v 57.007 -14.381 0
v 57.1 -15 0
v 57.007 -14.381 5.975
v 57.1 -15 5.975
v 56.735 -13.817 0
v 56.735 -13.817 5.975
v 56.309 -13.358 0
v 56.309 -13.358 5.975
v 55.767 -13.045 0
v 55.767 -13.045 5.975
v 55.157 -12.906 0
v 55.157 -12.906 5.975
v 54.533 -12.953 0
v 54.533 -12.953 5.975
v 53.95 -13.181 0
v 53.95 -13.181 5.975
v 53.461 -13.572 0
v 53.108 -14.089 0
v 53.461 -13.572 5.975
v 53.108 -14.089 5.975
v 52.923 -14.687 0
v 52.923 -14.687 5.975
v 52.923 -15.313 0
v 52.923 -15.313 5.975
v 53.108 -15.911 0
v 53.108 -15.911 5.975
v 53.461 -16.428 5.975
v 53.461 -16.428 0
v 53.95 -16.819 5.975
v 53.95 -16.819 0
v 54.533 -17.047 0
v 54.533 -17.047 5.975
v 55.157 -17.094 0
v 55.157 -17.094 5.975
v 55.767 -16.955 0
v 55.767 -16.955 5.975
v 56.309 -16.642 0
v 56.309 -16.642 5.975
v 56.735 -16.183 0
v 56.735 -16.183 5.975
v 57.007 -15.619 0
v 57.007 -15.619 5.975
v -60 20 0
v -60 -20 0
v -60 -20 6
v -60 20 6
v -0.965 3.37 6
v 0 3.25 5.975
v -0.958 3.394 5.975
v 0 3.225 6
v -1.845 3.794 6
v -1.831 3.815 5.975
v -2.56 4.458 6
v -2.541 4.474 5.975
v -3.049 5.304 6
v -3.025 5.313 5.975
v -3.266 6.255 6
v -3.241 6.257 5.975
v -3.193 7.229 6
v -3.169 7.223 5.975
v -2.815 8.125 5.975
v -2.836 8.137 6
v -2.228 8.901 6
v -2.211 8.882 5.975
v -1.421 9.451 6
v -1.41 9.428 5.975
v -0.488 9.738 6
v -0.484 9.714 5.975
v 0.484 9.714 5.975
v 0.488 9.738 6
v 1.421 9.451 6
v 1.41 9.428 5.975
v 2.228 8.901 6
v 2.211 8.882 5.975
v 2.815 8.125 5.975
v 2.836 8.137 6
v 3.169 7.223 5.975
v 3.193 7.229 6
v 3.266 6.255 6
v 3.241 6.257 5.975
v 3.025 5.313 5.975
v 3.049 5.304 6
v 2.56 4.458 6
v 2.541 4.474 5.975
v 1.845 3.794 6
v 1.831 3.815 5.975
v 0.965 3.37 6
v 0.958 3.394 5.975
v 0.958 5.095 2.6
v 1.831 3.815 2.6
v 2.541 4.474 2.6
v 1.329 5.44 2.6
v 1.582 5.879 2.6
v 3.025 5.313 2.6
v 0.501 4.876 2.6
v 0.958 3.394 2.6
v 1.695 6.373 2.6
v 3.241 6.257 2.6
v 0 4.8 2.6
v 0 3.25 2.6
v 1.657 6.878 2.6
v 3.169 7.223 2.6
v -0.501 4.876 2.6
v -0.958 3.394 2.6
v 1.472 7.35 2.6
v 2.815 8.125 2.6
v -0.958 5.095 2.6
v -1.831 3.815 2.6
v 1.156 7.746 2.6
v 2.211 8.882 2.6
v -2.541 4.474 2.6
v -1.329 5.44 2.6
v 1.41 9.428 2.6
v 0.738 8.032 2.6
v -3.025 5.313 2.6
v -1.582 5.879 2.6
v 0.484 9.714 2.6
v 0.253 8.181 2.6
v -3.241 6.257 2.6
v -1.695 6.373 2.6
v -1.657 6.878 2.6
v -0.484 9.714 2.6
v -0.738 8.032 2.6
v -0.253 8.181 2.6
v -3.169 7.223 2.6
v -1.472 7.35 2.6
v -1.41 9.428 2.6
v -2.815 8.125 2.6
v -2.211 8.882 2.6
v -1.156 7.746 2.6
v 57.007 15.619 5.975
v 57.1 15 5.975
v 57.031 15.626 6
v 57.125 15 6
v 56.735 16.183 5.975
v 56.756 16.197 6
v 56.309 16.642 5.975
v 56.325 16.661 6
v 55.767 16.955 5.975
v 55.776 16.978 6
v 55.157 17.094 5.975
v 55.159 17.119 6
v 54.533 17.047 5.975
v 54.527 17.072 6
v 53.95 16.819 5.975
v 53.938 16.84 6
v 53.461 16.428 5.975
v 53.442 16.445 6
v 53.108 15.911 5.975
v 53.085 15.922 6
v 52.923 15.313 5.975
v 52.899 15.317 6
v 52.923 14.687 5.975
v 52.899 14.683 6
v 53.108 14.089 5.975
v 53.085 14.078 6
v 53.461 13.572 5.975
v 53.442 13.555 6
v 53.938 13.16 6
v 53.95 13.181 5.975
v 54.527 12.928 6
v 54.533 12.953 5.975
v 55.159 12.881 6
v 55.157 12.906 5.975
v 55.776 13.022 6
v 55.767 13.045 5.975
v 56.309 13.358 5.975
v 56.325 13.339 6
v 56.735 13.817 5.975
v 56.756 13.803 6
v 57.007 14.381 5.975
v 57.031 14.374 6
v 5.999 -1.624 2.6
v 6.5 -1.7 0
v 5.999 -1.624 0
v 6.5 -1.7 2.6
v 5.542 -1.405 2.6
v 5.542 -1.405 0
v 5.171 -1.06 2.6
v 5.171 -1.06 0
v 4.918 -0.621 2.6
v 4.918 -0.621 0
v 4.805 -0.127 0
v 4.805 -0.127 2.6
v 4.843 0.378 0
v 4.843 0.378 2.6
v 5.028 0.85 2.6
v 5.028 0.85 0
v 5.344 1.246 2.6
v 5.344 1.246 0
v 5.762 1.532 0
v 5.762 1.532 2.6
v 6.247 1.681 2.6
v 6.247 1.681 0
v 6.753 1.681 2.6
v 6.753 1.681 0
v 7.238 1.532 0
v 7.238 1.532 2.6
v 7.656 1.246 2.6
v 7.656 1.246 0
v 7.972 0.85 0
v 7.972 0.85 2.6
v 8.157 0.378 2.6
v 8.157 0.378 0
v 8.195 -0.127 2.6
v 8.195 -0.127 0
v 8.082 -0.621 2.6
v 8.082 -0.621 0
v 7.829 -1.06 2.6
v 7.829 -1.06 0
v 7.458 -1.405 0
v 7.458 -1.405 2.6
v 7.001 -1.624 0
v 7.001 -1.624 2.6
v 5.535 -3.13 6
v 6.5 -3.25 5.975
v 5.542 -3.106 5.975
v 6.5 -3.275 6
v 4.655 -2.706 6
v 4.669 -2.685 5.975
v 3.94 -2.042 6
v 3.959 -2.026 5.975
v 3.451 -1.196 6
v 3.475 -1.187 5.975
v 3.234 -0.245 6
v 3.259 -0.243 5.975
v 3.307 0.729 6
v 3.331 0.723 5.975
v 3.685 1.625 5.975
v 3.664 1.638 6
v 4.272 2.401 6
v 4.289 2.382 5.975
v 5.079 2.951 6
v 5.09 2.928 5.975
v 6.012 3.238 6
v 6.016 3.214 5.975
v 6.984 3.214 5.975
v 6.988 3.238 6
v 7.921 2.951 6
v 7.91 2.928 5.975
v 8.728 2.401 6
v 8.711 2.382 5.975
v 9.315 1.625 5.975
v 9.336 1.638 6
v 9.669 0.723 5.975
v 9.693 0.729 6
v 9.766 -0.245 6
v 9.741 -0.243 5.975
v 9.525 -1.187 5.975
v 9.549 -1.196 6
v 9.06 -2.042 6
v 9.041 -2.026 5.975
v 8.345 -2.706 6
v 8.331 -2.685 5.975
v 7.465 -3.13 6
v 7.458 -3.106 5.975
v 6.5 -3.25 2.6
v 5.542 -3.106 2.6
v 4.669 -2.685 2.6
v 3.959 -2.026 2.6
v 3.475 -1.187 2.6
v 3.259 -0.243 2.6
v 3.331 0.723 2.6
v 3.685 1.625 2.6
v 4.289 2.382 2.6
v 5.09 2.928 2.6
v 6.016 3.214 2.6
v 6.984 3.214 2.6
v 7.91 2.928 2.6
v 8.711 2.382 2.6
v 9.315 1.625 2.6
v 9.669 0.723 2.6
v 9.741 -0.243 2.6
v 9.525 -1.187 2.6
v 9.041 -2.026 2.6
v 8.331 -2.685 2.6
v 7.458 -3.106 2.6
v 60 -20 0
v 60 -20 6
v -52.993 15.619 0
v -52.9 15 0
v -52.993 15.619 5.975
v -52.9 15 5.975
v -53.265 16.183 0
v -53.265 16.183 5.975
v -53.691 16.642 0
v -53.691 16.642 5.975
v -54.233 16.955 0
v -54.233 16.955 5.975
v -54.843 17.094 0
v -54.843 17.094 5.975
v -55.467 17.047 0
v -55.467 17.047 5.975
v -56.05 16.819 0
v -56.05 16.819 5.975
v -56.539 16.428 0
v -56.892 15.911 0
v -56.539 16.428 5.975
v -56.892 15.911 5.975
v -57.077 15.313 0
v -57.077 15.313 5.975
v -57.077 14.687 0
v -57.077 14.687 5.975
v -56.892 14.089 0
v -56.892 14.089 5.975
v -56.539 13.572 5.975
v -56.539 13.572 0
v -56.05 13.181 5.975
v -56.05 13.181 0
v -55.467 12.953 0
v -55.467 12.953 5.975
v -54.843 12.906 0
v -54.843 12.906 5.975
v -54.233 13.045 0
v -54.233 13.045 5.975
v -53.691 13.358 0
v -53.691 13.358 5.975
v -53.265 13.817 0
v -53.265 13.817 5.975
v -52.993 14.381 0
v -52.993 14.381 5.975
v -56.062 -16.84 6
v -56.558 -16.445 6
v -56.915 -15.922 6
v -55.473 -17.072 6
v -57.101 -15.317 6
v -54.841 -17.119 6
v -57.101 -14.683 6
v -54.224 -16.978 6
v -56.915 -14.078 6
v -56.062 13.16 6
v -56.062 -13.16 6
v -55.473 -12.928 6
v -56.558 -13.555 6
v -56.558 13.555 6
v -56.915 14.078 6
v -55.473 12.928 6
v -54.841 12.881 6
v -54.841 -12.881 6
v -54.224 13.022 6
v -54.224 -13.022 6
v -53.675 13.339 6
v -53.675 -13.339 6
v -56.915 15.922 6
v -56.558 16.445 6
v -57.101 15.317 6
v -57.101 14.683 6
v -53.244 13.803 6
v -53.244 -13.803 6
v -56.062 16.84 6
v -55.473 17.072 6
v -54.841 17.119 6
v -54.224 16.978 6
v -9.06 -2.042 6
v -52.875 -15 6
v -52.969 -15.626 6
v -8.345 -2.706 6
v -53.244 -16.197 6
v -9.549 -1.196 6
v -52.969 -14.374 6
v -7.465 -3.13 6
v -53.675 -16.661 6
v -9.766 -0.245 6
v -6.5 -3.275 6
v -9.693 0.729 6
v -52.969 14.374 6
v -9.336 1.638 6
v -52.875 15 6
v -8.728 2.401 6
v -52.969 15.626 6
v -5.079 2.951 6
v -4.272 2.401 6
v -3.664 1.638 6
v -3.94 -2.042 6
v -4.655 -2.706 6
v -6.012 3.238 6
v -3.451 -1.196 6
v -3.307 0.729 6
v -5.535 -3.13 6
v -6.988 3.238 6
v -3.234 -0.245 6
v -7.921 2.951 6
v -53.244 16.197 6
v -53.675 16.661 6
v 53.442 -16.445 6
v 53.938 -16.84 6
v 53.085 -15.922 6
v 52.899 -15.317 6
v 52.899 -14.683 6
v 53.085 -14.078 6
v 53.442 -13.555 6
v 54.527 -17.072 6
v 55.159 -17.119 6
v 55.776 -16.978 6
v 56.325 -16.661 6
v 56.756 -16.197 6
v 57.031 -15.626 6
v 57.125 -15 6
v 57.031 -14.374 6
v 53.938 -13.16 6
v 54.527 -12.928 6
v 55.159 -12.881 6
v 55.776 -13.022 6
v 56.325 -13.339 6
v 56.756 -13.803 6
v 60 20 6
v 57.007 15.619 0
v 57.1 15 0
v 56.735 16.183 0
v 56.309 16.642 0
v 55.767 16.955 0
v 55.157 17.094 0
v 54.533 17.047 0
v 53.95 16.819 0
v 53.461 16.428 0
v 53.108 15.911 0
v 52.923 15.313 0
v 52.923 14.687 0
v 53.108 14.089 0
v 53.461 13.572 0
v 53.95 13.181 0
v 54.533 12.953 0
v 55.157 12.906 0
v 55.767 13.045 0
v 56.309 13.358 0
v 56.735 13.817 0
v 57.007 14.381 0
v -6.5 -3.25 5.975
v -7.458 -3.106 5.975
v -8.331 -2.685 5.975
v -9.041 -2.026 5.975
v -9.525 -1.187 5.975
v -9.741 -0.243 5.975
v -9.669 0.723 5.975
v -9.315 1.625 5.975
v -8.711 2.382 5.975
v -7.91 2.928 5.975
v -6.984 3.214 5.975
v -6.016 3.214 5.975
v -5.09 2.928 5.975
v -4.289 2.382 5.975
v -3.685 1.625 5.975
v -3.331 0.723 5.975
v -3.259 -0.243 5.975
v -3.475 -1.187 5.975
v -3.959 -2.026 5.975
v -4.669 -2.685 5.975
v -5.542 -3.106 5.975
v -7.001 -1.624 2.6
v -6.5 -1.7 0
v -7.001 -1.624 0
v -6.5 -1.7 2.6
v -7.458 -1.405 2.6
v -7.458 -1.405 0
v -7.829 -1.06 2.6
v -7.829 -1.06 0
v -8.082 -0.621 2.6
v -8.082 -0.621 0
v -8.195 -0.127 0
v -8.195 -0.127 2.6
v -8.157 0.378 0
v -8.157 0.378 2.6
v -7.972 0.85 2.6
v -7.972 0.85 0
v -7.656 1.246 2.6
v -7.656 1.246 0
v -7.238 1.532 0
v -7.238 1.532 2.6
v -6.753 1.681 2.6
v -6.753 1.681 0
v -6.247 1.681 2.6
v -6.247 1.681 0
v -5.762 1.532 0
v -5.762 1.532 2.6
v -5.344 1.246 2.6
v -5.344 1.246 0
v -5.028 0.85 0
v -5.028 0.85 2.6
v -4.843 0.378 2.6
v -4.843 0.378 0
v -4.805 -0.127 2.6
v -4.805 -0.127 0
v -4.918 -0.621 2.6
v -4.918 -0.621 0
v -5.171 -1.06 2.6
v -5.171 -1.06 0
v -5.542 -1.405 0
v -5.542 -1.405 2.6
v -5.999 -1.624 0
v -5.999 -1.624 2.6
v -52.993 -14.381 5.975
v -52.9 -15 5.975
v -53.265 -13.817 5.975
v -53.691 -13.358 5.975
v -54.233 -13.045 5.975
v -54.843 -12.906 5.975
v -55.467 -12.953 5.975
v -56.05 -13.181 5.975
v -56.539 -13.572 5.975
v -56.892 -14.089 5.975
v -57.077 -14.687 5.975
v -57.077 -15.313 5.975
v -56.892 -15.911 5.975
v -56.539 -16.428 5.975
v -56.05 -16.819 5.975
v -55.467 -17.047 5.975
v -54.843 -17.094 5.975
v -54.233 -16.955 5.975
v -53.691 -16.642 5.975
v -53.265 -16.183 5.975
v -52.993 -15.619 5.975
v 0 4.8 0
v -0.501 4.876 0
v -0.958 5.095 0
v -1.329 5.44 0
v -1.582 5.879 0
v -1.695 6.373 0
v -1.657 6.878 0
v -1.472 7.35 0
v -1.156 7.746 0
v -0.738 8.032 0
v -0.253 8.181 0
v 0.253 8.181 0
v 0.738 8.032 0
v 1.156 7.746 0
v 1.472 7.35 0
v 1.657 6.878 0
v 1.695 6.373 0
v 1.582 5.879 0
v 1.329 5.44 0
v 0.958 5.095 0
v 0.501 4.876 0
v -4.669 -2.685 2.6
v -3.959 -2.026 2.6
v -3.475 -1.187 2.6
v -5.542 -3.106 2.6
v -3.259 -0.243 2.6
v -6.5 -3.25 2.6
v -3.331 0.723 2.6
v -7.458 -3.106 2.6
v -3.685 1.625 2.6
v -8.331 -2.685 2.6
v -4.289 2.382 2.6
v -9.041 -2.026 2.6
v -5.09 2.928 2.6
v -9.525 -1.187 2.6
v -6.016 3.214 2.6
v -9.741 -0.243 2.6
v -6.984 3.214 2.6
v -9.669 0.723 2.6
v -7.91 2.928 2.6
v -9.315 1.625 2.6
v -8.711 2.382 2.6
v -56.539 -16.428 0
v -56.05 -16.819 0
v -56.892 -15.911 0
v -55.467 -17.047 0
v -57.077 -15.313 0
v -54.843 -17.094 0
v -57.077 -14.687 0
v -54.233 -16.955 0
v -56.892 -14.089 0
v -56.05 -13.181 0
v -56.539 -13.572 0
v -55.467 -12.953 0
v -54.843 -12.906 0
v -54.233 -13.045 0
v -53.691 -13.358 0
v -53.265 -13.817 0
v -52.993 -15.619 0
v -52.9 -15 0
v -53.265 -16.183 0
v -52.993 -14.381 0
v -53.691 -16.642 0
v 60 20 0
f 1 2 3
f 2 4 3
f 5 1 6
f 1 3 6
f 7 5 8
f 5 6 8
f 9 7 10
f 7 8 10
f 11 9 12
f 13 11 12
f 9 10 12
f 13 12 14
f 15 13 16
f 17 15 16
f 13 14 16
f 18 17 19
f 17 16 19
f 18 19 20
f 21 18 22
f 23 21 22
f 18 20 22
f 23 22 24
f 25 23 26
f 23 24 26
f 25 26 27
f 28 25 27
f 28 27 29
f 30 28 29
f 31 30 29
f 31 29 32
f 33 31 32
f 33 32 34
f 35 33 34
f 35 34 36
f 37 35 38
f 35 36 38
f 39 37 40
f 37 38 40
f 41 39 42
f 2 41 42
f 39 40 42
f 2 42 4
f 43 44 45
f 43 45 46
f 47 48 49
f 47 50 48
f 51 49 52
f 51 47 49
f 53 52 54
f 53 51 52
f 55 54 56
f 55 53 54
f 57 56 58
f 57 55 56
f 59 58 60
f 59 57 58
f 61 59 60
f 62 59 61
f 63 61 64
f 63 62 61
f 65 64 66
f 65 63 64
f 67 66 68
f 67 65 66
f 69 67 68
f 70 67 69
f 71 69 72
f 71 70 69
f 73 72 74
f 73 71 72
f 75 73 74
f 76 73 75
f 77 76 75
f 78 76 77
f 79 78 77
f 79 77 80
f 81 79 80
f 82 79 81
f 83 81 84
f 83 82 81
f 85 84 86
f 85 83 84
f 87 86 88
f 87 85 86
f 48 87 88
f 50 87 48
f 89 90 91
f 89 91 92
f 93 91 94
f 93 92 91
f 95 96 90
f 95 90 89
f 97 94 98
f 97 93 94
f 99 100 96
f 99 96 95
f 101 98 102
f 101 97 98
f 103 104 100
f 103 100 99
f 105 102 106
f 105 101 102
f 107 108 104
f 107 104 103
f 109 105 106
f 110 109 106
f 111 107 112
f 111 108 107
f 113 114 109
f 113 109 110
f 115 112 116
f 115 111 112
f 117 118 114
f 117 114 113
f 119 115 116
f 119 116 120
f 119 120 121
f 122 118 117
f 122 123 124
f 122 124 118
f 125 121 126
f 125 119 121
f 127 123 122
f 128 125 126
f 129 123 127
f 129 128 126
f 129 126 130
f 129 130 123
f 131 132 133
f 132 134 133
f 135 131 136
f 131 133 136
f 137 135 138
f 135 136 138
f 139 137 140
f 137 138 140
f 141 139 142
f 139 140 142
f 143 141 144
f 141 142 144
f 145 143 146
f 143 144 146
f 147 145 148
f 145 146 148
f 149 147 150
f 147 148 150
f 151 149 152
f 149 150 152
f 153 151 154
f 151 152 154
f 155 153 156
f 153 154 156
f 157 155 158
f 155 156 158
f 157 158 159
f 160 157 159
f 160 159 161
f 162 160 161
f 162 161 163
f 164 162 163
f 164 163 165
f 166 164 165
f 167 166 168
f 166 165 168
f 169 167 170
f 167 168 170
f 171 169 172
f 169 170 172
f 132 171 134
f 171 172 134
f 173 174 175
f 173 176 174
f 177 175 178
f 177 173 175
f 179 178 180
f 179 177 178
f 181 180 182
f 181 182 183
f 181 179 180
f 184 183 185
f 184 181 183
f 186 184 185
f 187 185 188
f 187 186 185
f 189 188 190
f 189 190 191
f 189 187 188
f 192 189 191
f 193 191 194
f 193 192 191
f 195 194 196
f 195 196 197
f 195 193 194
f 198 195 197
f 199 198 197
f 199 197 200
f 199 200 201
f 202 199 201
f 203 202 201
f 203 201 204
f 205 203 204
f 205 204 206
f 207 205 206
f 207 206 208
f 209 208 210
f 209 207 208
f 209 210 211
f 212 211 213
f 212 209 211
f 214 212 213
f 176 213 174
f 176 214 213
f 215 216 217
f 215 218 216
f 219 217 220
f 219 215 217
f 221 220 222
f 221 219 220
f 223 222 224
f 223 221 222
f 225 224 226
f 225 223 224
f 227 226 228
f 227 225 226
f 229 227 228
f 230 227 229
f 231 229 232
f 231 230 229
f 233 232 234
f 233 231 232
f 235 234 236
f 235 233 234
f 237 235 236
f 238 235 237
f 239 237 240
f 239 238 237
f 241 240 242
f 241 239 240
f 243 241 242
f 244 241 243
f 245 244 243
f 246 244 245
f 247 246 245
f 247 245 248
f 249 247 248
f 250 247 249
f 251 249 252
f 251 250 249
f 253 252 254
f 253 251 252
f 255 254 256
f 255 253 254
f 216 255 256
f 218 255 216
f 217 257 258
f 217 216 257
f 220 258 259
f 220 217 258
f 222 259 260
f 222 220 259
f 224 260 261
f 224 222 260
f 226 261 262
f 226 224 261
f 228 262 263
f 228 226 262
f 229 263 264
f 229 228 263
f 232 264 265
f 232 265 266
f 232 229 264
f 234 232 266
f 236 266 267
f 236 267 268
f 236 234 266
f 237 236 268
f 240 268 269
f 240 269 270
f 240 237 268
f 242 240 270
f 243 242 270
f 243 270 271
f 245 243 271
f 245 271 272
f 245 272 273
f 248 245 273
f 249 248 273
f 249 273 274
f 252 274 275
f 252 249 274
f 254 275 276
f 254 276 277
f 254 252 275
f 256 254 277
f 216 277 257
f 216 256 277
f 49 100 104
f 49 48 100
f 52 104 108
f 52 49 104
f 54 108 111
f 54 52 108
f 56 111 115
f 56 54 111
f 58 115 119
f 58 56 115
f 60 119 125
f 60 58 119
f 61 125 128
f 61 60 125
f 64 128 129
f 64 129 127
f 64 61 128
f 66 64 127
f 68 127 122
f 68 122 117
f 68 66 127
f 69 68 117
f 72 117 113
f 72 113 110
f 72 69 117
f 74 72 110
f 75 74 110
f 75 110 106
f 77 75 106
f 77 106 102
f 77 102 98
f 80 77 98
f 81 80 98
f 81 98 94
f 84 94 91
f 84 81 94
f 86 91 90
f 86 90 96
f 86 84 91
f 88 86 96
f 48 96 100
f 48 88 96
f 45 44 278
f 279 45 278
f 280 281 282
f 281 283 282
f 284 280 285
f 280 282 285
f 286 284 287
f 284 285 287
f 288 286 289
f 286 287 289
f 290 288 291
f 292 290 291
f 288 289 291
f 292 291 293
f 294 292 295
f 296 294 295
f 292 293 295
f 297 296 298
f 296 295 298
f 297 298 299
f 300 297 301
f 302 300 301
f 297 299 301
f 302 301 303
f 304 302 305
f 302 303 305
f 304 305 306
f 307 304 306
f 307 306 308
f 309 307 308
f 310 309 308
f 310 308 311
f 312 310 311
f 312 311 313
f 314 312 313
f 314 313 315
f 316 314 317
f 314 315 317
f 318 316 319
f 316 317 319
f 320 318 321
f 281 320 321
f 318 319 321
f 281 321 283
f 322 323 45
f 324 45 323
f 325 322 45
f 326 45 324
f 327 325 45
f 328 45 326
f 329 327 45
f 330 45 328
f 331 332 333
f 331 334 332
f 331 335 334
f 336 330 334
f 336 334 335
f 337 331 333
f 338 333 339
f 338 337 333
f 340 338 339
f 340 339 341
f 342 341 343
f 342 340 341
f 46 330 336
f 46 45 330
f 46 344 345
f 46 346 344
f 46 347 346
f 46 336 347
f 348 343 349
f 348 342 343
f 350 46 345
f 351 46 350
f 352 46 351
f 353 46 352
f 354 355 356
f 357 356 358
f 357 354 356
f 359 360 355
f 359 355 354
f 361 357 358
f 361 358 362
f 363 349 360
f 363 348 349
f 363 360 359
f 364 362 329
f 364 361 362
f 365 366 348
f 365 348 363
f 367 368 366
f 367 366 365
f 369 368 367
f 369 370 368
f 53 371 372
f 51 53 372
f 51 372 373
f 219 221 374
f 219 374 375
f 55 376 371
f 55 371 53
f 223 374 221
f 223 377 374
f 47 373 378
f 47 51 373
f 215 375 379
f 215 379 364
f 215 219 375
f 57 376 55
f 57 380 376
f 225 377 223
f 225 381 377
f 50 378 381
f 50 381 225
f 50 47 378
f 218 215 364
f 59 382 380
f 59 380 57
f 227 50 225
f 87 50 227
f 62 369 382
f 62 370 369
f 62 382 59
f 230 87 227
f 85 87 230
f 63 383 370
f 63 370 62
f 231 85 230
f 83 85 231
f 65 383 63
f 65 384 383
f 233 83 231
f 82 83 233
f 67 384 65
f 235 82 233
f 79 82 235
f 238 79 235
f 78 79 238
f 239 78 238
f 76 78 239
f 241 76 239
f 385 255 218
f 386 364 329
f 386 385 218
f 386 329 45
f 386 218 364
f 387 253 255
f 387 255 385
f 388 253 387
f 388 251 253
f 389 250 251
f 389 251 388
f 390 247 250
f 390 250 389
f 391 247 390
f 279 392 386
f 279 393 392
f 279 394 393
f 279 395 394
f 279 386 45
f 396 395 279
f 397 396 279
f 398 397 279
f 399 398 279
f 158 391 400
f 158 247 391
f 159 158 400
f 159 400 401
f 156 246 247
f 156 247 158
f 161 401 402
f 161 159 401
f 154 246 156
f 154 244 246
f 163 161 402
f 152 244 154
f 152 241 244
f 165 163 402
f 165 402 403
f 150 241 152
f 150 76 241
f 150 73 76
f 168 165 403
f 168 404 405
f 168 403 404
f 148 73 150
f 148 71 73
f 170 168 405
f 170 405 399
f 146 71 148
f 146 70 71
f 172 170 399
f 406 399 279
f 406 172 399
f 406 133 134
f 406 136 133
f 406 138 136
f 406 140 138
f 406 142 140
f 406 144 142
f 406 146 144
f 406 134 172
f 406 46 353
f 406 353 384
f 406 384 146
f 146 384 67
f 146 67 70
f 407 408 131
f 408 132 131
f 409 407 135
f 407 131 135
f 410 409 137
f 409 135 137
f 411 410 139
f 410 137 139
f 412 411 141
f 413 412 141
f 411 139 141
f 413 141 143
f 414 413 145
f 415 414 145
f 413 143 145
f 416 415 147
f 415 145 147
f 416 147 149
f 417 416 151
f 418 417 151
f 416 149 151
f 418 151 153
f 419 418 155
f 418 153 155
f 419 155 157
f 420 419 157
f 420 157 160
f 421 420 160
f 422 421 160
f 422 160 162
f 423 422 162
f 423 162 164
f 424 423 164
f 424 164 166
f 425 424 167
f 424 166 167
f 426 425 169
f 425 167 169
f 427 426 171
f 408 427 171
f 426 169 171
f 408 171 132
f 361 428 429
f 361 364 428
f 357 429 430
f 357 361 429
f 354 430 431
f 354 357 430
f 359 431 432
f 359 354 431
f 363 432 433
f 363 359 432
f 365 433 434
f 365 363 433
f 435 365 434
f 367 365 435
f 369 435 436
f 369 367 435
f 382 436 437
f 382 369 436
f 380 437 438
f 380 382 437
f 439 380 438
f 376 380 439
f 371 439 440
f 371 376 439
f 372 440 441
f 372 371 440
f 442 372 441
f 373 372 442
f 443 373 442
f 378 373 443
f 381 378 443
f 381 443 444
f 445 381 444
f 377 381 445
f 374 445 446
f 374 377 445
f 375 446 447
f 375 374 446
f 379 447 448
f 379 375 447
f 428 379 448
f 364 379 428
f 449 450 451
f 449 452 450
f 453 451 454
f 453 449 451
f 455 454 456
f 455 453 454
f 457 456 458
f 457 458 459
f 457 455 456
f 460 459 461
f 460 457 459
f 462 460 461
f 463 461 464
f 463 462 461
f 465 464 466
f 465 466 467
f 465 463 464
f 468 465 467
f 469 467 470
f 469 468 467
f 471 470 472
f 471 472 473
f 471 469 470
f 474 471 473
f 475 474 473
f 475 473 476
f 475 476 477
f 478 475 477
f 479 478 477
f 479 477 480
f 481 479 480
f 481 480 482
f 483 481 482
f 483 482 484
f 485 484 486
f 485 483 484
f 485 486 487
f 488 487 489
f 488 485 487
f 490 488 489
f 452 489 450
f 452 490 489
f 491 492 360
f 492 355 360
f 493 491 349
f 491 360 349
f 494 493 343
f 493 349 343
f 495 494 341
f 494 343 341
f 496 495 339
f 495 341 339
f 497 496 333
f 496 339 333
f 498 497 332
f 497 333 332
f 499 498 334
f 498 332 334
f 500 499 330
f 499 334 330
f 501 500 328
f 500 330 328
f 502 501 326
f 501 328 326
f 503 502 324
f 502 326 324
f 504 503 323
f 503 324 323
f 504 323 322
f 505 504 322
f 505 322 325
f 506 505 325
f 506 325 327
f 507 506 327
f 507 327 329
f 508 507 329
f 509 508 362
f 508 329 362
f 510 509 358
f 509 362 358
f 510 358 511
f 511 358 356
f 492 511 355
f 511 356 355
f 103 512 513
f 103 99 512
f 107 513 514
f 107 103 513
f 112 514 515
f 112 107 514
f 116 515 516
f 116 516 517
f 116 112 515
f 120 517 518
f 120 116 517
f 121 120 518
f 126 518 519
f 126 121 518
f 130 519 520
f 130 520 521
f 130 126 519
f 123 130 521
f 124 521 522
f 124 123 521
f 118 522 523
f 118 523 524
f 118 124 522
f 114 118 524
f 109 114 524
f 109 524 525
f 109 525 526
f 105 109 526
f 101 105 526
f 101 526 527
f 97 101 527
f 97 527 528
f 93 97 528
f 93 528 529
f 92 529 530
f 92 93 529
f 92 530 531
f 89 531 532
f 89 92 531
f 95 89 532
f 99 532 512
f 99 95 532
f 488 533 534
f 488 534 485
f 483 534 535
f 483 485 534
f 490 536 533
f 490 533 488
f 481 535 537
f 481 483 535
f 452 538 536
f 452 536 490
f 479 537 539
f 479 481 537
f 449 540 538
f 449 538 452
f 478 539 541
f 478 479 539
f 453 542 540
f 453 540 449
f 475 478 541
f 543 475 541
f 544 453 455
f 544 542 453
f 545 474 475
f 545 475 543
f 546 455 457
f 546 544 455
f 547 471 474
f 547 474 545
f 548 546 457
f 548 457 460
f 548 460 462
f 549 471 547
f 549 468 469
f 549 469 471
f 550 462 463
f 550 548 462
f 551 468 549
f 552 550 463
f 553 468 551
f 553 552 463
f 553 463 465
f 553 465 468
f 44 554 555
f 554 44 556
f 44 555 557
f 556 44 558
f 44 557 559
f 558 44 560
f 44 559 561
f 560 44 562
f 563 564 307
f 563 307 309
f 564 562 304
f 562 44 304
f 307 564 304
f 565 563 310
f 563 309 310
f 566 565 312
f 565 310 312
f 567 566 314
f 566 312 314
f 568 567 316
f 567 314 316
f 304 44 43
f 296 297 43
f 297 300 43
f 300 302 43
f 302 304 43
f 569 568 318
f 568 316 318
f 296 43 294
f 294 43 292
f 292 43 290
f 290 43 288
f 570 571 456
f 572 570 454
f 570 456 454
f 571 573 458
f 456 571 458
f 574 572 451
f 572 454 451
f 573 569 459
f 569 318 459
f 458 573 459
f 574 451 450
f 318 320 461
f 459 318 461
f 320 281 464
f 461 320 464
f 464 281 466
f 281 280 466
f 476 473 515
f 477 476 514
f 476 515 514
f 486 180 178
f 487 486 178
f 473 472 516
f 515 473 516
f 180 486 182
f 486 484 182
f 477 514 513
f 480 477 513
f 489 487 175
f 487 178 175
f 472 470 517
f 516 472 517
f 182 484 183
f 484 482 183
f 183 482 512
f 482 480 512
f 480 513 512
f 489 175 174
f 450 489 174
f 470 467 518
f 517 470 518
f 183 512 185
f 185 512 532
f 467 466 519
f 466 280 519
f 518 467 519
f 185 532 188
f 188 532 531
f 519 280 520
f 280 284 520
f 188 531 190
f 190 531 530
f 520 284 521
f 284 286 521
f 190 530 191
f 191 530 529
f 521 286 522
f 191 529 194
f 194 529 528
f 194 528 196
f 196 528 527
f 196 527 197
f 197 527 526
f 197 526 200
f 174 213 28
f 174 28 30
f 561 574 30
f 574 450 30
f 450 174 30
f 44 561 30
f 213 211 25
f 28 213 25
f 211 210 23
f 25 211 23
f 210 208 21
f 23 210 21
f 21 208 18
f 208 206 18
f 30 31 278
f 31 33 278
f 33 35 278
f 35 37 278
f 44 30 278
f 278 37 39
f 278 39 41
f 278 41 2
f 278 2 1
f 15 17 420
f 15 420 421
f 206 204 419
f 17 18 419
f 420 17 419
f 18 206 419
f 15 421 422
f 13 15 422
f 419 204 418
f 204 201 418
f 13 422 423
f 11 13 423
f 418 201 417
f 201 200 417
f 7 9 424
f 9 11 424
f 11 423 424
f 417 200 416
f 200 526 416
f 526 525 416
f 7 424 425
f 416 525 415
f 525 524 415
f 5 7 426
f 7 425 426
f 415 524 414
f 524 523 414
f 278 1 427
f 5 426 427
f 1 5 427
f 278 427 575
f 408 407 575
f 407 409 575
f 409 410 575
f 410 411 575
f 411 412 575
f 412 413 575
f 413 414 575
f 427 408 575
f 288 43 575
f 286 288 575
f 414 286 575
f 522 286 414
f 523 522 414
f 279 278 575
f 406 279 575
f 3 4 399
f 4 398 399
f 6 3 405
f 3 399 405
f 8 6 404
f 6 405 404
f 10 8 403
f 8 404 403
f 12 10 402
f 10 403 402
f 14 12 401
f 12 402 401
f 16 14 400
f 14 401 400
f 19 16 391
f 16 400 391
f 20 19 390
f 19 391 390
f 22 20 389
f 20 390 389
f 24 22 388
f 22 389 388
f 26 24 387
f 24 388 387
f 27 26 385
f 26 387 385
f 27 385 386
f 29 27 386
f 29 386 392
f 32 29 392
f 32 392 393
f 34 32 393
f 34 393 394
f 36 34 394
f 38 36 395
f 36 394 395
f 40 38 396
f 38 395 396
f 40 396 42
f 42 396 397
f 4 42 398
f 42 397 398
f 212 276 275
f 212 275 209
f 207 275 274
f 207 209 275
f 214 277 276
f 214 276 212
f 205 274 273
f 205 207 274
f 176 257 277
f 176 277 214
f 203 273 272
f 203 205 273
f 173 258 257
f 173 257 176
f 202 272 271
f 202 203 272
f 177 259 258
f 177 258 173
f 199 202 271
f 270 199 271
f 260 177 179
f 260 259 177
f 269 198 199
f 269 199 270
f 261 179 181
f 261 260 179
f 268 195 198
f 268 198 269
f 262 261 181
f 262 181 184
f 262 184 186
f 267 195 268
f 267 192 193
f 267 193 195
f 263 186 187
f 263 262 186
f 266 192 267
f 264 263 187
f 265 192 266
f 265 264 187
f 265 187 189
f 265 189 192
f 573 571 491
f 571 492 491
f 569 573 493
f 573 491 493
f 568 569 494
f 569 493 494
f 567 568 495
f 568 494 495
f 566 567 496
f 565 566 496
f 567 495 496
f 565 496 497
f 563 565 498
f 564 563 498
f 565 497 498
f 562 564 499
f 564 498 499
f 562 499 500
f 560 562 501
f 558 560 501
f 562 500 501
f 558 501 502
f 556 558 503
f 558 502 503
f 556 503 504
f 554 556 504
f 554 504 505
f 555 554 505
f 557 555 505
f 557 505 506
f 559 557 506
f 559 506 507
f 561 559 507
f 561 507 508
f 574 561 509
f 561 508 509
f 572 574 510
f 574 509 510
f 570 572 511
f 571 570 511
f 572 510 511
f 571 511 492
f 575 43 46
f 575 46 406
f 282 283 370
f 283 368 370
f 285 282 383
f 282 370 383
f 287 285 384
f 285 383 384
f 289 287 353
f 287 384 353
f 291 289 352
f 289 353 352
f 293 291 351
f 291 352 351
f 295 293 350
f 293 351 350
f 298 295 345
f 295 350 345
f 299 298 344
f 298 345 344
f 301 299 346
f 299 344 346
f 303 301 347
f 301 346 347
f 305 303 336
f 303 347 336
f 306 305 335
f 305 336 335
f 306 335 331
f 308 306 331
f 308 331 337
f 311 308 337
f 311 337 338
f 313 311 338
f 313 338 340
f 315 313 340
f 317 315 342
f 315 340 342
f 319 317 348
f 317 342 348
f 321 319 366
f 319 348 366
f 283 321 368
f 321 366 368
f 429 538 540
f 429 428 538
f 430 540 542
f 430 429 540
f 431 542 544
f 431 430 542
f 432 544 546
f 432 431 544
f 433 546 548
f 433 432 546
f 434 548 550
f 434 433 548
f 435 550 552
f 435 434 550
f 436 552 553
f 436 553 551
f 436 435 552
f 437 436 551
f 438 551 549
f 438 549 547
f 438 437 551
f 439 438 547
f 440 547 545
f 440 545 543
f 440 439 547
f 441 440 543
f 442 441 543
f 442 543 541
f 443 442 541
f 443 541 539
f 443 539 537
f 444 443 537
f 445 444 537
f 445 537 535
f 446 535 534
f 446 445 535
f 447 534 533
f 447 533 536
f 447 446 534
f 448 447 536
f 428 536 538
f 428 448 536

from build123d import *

# Parameters (mm, degrees)
SKETCH1_R                                    = 10
BOSS_EXTRUDE1_DEPTH                          = 6
CBORE_FOR_M3_HEX_SOCKET_HEAD_CAP_SCR_2_COUNT = 2
CBORE_FOR_M3_HEX_SOCKET_HEAD_CAP_SCR_2_PITCH = 9.192388155
CBORE_FOR_M3_HEX_SOCKET_HEAD_CAP_SCR_3_COUNT = 2
CBORE_FOR_M3_HEX_SOCKET_HEAD_CAP_SCR_3_PITCH = 13
BOSS_EXTRUDE2_START                          = -6
SKETCH6_W                                    = 120
SKETCH6_H                                    = 40
SKETCH6_R                                    = 10
BOSS_EXTRUDE2_DEPTH                          = 6


# Read off the part's stored shape, not the designer's step: Tap Drill for M4 Helicoil1
with BuildPart() as part:
    # Sketch1 → Boss-Extrude1 (new body)
    with BuildSketch(Plane.XY):
        Circle(SKETCH1_R)
    extrude(amount=BOSS_EXTRUDE1_DEPTH)

    # Sketch5 → CBORE for M3 Hex Socket Head Cap Screw1 (revolve, cut)
    with BuildSketch(Plane(origin=(-6.5, 0, 6), x_dir=(0, -1, 0), z_dir=(1, 0, 0))):
        Polygon((0, 0), (0, 6), (1.7, 6), (1.7, 3.4), (3.25, 3.4), (3.25, 0.025), (3.275, 0), align=None)
    cbore_for_m3_hex_socket_head_cap_screw1 = revolve(axis=Axis((-6.5, 0, 12.35), (0, 0, -1)), mode=Mode.SUBTRACT)

    # CBORE for M3 Hex Socket Head Cap Scr 2: CBORE for M3 Hex Socket Head Cap Screw1 ×2
    with Locations(*[Vector(0.7071067811865476, 0.7071067811865476, 0) * (i * CBORE_FOR_M3_HEX_SOCKET_HEAD_CAP_SCR_2_PITCH) for i in range(1, CBORE_FOR_M3_HEX_SOCKET_HEAD_CAP_SCR_2_COUNT)]):
        add(cbore_for_m3_hex_socket_head_cap_screw1, mode=Mode.SUBTRACT)

    # CBORE for M3 Hex Socket Head Cap Scr 3: CBORE for M3 Hex Socket Head Cap Screw1 ×2
    with Locations(*[(i * CBORE_FOR_M3_HEX_SOCKET_HEAD_CAP_SCR_3_PITCH, 0, 0) for i in range(1, CBORE_FOR_M3_HEX_SOCKET_HEAD_CAP_SCR_3_COUNT)]):
        add(cbore_for_m3_hex_socket_head_cap_screw1, mode=Mode.SUBTRACT)

    # Sketch6 → Boss-Extrude2 (add)
    with BuildSketch(Plane.XY.offset(6).offset(BOSS_EXTRUDE2_START)):
        Rectangle(SKETCH6_W, SKETCH6_H)
        Circle(SKETCH6_R, mode=Mode.SUBTRACT)
    extrude(amount=BOSS_EXTRUDE2_DEPTH)

    # Tap Drill for M4 Helicoil1 outline → Tap Drill for M4 Helicoil1 (revolve, cut)
    with BuildSketch(Plane(origin=(55, -15, 0), x_dir=(1, 0, 0), z_dir=(0, -1, 0))):
        Polygon((0, 0), (2.1, 0), (2.1, 5.975), (2.125, 6), (0, 6), align=None)
    revolve(axis=Axis((55, -15, 0), (0, 0, 1)), mode=Mode.SUBTRACT)

    # Tap Drill for M4 Helicoil1 2 outline → Tap Drill for M4 Helicoil1 2 (revolve, cut)
    with BuildSketch(Plane(origin=(-55, -15, 0), x_dir=(1, 0, 0), z_dir=(0, -1, 0))):
        Polygon((0, 0), (2.1, 0), (2.1, 5.975), (2.125, 6), (0, 6), align=None)
    revolve(axis=Axis((-55, -15, 0), (0, 0, 1)), mode=Mode.SUBTRACT)

    # Tap Drill for M4 Helicoil1 3 outline → Tap Drill for M4 Helicoil1 3 (revolve, cut)
    with BuildSketch(Plane(origin=(-55, 15, 0), x_dir=(1, 0, 0), z_dir=(0, -1, 0))):
        Polygon((0, 0), (2.1, 0), (2.1, 5.975), (2.125, 6), (0, 6), align=None)
    revolve(axis=Axis((-55, 15, 0), (0, 0, 1)), mode=Mode.SUBTRACT)

    # Tap Drill for M4 Helicoil1 4 outline → Tap Drill for M4 Helicoil1 4 (revolve, cut)
    with BuildSketch(Plane(origin=(55, 15, 0), x_dir=(1, 0, 0), z_dir=(0, -1, 0))):
        Polygon((0, 0), (2.1, 0), (2.1, 5.975), (2.125, 6), (0, 6), align=None)
    revolve(axis=Axis((55, 15, 0), (0, 0, 1)), mode=Mode.SUBTRACT)


solid = part.part
